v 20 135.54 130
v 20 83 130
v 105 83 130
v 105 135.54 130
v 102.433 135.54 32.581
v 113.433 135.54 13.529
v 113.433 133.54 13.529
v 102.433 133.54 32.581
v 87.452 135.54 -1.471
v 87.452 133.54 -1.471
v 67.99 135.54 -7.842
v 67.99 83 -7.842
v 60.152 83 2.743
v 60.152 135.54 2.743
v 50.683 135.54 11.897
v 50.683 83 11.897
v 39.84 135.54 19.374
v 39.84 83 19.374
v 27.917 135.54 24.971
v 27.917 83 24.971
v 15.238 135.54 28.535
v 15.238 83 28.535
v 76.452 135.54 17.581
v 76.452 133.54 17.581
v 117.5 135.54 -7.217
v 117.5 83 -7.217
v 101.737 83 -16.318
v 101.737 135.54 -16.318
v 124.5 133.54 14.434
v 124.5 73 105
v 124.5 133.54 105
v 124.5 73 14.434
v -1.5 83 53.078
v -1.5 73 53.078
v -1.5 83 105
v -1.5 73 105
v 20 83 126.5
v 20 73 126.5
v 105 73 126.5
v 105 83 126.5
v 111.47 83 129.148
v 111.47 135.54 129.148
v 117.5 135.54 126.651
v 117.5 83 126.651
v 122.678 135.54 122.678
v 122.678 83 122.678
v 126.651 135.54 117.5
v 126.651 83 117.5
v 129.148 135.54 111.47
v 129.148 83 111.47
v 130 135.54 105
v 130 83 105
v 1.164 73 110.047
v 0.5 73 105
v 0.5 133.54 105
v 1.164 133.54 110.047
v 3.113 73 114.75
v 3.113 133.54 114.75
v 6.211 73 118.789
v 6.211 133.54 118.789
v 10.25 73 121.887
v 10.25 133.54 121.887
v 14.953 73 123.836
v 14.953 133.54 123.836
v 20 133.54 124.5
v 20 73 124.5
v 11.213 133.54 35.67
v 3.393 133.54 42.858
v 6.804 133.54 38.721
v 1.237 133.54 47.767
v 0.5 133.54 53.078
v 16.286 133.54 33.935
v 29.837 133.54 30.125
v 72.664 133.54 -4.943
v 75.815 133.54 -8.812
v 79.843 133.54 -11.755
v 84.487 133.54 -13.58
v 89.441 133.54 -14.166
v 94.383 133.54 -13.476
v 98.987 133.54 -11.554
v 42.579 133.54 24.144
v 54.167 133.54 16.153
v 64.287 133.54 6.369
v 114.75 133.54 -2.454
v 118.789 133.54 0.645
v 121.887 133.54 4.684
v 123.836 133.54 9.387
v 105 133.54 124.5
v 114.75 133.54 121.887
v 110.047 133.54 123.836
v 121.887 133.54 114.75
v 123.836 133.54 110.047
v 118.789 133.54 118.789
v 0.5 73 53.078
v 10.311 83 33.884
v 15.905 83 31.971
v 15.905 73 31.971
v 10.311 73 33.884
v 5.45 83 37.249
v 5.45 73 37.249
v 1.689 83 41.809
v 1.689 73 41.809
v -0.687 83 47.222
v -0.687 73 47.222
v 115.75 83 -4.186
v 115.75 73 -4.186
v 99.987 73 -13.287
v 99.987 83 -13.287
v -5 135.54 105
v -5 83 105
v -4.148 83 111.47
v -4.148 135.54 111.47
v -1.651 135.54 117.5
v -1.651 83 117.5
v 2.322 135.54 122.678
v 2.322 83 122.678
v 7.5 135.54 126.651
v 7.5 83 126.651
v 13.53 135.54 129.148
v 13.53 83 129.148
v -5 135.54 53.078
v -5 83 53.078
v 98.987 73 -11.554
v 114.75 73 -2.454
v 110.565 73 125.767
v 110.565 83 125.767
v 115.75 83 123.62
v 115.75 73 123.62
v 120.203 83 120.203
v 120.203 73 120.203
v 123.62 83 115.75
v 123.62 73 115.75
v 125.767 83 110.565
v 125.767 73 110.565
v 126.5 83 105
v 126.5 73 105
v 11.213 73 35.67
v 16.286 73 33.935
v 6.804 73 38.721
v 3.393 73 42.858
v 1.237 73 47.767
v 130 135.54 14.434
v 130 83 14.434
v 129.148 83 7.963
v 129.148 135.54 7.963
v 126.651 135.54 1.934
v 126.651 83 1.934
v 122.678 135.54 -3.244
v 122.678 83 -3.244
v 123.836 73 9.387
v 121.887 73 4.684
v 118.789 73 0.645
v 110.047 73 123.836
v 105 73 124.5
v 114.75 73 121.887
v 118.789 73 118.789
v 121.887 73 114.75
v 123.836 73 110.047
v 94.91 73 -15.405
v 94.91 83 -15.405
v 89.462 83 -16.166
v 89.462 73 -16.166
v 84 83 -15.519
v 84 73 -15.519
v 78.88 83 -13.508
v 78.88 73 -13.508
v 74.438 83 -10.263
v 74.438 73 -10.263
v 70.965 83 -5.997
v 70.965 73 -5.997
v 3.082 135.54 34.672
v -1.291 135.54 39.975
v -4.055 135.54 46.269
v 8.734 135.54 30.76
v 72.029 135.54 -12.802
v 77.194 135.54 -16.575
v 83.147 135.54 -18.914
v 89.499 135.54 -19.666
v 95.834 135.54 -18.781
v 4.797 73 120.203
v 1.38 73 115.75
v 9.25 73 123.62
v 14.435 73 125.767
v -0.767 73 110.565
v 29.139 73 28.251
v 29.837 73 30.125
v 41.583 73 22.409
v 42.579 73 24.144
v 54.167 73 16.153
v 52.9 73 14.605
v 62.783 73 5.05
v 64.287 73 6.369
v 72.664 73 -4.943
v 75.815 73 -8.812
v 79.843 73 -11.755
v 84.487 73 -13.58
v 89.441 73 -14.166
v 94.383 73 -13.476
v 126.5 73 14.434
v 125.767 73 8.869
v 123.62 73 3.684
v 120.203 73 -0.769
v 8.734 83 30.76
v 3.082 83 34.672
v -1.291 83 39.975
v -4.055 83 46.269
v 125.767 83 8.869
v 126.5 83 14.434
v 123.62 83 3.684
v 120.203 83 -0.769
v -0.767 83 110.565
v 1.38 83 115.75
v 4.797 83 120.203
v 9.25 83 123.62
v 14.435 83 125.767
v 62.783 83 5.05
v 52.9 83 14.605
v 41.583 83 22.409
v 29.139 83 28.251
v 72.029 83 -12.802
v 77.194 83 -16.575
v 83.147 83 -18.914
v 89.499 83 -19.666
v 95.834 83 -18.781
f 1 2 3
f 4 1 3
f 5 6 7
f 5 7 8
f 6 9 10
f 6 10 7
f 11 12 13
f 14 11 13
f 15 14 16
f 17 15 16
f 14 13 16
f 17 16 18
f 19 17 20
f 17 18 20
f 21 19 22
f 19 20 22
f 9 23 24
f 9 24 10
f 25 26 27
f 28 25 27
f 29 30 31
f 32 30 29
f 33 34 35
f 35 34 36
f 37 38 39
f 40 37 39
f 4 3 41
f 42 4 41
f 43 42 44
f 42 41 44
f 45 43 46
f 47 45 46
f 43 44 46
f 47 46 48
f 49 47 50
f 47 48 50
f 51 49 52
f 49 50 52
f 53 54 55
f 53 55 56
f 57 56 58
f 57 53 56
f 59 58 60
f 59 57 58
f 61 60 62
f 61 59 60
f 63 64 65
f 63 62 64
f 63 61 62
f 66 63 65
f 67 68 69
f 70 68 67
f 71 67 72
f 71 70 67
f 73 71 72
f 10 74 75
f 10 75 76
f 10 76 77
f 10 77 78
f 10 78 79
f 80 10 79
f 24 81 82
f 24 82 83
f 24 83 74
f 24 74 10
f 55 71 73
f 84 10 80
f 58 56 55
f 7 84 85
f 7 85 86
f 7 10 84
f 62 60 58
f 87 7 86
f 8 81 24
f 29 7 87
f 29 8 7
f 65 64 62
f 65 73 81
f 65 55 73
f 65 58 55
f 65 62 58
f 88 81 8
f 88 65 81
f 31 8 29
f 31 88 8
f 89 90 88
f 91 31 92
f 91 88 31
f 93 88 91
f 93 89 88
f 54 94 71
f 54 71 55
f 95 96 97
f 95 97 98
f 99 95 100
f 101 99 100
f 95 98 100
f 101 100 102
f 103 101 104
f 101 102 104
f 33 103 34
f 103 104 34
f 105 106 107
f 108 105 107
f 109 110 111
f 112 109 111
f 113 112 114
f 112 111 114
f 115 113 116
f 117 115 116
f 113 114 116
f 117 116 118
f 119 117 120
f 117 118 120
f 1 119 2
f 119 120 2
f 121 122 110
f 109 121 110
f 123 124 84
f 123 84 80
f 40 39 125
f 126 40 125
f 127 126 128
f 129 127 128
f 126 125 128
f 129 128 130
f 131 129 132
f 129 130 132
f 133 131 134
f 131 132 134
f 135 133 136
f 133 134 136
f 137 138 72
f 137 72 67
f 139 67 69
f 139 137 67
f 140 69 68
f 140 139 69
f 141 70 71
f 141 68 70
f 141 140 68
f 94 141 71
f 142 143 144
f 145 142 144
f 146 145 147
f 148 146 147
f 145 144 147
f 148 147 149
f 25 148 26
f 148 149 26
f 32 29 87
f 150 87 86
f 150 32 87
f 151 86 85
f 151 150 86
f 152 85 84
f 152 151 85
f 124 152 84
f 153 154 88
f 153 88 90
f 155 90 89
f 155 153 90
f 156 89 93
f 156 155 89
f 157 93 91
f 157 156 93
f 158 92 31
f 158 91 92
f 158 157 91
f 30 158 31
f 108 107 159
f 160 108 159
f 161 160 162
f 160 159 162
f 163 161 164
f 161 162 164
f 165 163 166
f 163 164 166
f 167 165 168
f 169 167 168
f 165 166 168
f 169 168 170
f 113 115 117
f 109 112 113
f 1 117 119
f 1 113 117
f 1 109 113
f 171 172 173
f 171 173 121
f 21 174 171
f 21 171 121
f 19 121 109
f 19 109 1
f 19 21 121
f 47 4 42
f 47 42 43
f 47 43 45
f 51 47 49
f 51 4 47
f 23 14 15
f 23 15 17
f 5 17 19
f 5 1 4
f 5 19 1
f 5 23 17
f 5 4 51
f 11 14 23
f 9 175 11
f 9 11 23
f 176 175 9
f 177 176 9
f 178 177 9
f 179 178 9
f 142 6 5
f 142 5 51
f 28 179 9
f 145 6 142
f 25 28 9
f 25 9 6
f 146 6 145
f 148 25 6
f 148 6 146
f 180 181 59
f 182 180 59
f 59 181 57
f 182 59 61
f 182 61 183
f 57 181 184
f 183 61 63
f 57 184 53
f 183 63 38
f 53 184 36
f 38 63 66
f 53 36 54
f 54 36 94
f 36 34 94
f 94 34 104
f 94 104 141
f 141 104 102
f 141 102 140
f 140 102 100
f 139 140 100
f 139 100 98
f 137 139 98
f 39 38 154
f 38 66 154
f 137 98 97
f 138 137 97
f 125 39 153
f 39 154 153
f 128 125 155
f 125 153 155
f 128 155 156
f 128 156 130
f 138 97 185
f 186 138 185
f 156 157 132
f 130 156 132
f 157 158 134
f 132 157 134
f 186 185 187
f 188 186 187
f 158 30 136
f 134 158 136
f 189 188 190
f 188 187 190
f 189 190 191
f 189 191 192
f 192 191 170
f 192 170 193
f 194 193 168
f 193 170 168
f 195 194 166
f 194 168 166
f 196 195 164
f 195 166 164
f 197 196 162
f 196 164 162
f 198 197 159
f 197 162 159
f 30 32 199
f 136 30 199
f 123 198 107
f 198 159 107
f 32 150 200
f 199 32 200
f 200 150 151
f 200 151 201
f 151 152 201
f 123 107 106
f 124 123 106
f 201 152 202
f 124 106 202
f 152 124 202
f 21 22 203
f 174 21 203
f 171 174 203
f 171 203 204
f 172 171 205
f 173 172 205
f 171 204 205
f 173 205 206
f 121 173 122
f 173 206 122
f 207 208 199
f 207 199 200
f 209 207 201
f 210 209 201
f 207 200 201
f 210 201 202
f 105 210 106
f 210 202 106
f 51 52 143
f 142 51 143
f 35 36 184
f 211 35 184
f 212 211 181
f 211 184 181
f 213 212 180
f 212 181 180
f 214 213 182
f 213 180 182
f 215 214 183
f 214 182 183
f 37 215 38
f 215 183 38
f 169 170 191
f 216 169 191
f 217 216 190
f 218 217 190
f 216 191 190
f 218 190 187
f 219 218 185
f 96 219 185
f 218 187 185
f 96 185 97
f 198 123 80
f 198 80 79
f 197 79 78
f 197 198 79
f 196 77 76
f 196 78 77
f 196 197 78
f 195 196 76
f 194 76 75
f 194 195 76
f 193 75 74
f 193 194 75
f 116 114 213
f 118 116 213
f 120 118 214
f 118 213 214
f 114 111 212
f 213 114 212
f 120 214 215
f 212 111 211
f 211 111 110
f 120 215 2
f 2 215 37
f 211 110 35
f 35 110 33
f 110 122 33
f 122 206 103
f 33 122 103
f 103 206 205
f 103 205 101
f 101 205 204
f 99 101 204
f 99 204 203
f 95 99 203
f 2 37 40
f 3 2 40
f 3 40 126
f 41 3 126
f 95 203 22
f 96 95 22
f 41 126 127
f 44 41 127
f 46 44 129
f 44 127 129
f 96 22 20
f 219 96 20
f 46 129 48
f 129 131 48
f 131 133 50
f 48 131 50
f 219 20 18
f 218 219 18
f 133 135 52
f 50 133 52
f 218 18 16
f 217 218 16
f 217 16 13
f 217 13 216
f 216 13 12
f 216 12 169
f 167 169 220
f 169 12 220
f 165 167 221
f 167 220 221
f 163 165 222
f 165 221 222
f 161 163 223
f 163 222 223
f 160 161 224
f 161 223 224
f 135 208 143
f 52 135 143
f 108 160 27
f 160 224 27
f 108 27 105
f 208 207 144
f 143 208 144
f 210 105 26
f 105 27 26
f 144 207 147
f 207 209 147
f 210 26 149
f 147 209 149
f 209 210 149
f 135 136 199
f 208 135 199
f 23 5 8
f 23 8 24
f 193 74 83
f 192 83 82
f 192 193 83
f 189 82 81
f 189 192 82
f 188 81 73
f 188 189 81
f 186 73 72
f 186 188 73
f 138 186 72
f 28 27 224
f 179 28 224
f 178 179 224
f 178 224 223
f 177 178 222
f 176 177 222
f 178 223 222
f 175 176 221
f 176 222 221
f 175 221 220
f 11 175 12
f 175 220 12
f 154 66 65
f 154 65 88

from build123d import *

# Parameters (mm, degrees)
SKETCH1_W               = 260
SKETCH1_H               = 100
BOSS_EXTRUDE1_DEPTH     = 3
CUT_EXTRUDE1_DEPTH      = 5
SKETCH5_W               = 260
SKETCH5_H               = 80
BOSS_EXTRUDE4_DEPTH     = 3
BOSS_EXTRUDE5_START     = 70
BOSS_EXTRUDE5_DEPTH     = 70
BOSS_EXTRUDE6_DEPTH     = 70
CUT_EXTRUDE3_DEPTH      = 198.810515393
SKETCH10_R              = 5
SKETCH10_R_2            = 1.75
BOSS_EXTRUDE7_DEPTH     = 50
CHAMFER1_SIZE           = 5
CHAMFER1_SIZE2          = 8.660254038
FILLET1_R               = 22
FILLET2_R               = 25
CUT_EXTRUDE4_START      = 20
CUT_EXTRUDE4_DEPTH      = 20
SKETCH12_R              = 1.75
CUT_EXTRUDE5_DEPTH      = 20
CUT_EXTRUDE6_DEPTH      = 40
FILLET3_R               = 5
BOSS_EXTRUDE8_DEPTH     = 10
CUT_EXTRUDE7_DEPTH      = 202.715145688
CUT_EXTRUDE7_DEPTH_BACK = 202.715145688
SKETCH16_W              = 135
SKETCH16_H              = 73
BOSS_EXTRUDE9_DEPTH     = 52.54
CUT_EXTRUDE8_DEPTH      = 5
CUT_EXTRUDE10_DEPTH     = 50.54


with BuildPart() as part:
    # Sketch1 → Boss-Extrude1 (new body)
    with BuildSketch(Plane(origin=(0, 0, 0), x_dir=(1, 0, 0), z_dir=(0, 1, 0))):
        Rectangle(SKETCH1_W, SKETCH1_H)
    extrude(amount=BOSS_EXTRUDE1_DEPTH)

    # Sketch4 → Cut-Extrude1 (cut)
    with BuildSketch(Plane(origin=(0, 3, 0), x_dir=(1, 0, 0), z_dir=(0, 1, 0))):
        with BuildLine():
            Line((-77.534249575, 30.291115131), (-130, 0))
            Line((-130, 0), (-130, 50))
            Line((-130, 50), (130, 50))
            Line((130, 50), (130, 0))
            Line((130, 0), (77.534249575, 30.291115131))
            ThreePointArc((77.534249575, 30.291115131), (0, -30), (-77.534249575, 30.291115131))
        make_face()
    extrude(amount=-CUT_EXTRUDE1_DEPTH, mode=Mode.SUBTRACT)

    # Sketch5 → Boss-Extrude4 (add)
    with BuildSketch(Plane(origin=(0, 3, 0), x_dir=(1, 0, 0), z_dir=(0, 1, 0))):
        with Locations((0, -90)):
            Rectangle(SKETCH5_W, SKETCH5_H)
    extrude(amount=-BOSS_EXTRUDE4_DEPTH)

    # Sketch6 → Boss-Extrude5 (add)
    with BuildSketch(Plane(origin=(0, 3, 0), x_dir=(1, 0, 0), z_dir=(0, 1, 0)).offset(BOSS_EXTRUDE5_START)):
        with BuildLine():
            Line((-77.534249575, 30.291115131), (-130, 0))
            Line((-130, 0), (-130, -130))
            Line((-130, -130), (130, -130))
            Line((130, -130), (130, 0))
            Line((130, 0), (77.534249575, 30.291115131))
            ThreePointArc((77.534249575, 30.291115131), (0, -30), (-77.534249575, 30.291115131))
        make_face()
        with BuildLine():
            Line((-79.381629809, 25.76042804), (-127, -1.732050808))
            Line((-127, -1.732050808), (-127, -127))
            Line((-127, -127), (127, -127))
            Line((127, -127), (127, -1.732050808))
            Line((127, -1.732050808), (79.381629809, 25.76042804))
            ThreePointArc((79.381629809, 25.76042804), (0, -33), (-79.381629809, 25.76042804))
        make_face(mode=Mode.SUBTRACT)
    extrude(amount=-BOSS_EXTRUDE5_DEPTH)

    # Sketch7 → Boss-Extrude6 (add)
    with BuildSketch(Plane(origin=(0, 73, 0), x_dir=(1, 0, 0), z_dir=(0, 1, 0))):
        with BuildLine():
            Line((-5, -32.849260709), (-5, -130))
            Line((-5, -130), (-2, -130))
            Line((-2, -130), (-2, -32.975900116))
            ThreePointArc((-2, -32.975900116), (-3.500572722, -32.92614781), (-5, -32.849260709))
        make_face()
    extrude(amount=-BOSS_EXTRUDE6_DEPTH)

    # Sketch9 → Cut-Extrude3 (cut, through all)
    with BuildSketch(Plane(origin=(0, 73, 0), x_dir=(1, 0, 0), z_dir=(0, 1, 0))):
        Polygon((-5, -32.849260709), (-5, -144.876678539), (-379.728059333, -144.876678539), (-379.728059333, 52.069032857), (-5, 52.069032857), align=None)
    extrude(amount=-CUT_EXTRUDE3_DEPTH, mode=Mode.SUBTRACT)

    # Sketch10 → Boss-Extrude7 (add)
    # profile 1 of 4: a face of its own
    with BuildSketch(Plane(origin=(0, 3, 0), x_dir=(1, 0, 0), z_dir=(0, 1, 0))):
        with Locations(Location((14, -46.75, 0), (0, 0, 90))):
            Circle(SKETCH10_R)
        with Locations(Location((14, -46.75, 0), (0, 0, 270))):
            Circle(SKETCH10_R_2, mode=Mode.SUBTRACT)
    # profile 2 of 4: a face of its own
    with BuildSketch(Plane(origin=(0, 3, 0), x_dir=(1, 0, 0), z_dir=(0, 1, 0))):
        with Locations(Location((86, -46.75, 0), (0, 0, 90))):
            Circle(SKETCH10_R)
        with Locations(Location((86, -46.75, 0), (0, 0, 270))):
            Circle(SKETCH10_R_2, mode=Mode.SUBTRACT)
    # profile 3 of 4: a face of its own
    with BuildSketch(Plane(origin=(0, 3, 0), x_dir=(1, 0, 0), z_dir=(0, 1, 0))):
        with Locations(Location((86, -113.25, 0), (0, 0, 90))):
            Circle(SKETCH10_R)
        with Locations(Location((86, -113.25, 0), (0, 0, 270))):
            Circle(SKETCH10_R_2, mode=Mode.SUBTRACT)
    # profile 4 of 4: a face of its own
    with BuildSketch(Plane(origin=(0, 3, 0), x_dir=(1, 0, 0), z_dir=(0, 1, 0))):
        with Locations(Location((14, -113.25, 0), (0, 0, 90))):
            Circle(SKETCH10_R)
        with Locations(Location((14, -113.25, 0), (0, 0, 270))):
            Circle(SKETCH10_R_2, mode=Mode.SUBTRACT)
    extrude(amount=BOSS_EXTRUDE7_DEPTH)

    # Chamfer1
    chamfer1_edges = [part.edges().sort_by_distance(p)[0] for p in [
        (86, 3, 51.75),
        (14, 3, 51.75),
        (86, 3, 118.25),
        (14, 3, 118.25),
    ]]
    chamfer1_side = [part.faces().sort_by_distance(p)[0] for p in [
        (68.049806081, 3, 64.998636776),
    ]]
    chamfer(chamfer1_edges, length=CHAMFER1_SIZE, length2=CHAMFER1_SIZE2, reference=chamfer1_side[0])

    # Fillet1
    fillet1_edges = [part.edges().sort_by_distance(p)[0] for p in [
        (-2, 38, 127),
        (-2, 38, 32.975900116),
        (127, 38, 127),
        (127, 38, 1.732050808),
        (79.381629809, 38, -25.76042804),
    ]]
    fillet(fillet1_edges, radius=FILLET1_R)

    # Fillet2
    fillet2_edges = [part.edges().sort_by_distance(p)[0] for p in [
        (-5, 36.5, 29.843597113),
        (-5, 36.5, 130),
        (77.534249575, 36.5, -30.291115131),
        (130, 36.5, 0),
        (130, 36.5, 130),
    ]]
    fillet(fillet2_edges, radius=FILLET2_R)

    # Sketch11 → Cut-Extrude4 (cut)
    with BuildSketch(Plane(origin=(0, 3, 0), x_dir=(1, 0, 0), z_dir=(0, 1, 0)).offset(CUT_EXTRUDE4_START)):
        with BuildLine():
            Line((52.464250206, -10.394556462), (54.431659589, -12.65935233))
            ThreePointArc((54.431659589, -12.65935233), (36.359512028, -24.612236832), (15.80952381, -31.480420697))
            Line((15.80952381, -31.480420697), (15.238095238, -28.53534525))
            ThreePointArc((15.238095238, -28.53534525), (35.045312798, -21.915408995), (52.464250206, -10.394556462))
        make_face()
        Polygon((101.737077009, 16.317606197), (100.237077009, 13.719529986), (116, 4.618802154), (117.5, 7.216878365), align=None)
    extrude(amount=-CUT_EXTRUDE4_DEPTH, mode=Mode.SUBTRACT)

    # Sketch12 → Cut-Extrude5 (cut)
    with BuildSketch(Plane(origin=(0, 3, 0), x_dir=(1, 0, 0), z_dir=(0, 1, 0))):
        with Locations(Location((89.237077009, -5.333028897, 0), (0, 0, 270))):
            Circle(SKETCH12_R)
        with Locations(Location((105, -105, 0), (0, 0, 270))):
            Circle(SKETCH12_R)
        with Locations(Location((15, -105, 0), (0, 0, 66.494954424))):
            Circle(SKETCH12_R)
        with Locations(Location((15, -55, 0), (0, 0, 260.317408662))):
            Circle(SKETCH12_R)
    extrude(amount=-CUT_EXTRUDE5_DEPTH, mode=Mode.SUBTRACT)

    # Sketch14 → Cut-Extrude6 (cut)
    with BuildSketch(Plane.XZ.offset(-23)):
        Polygon((101.737077009, -16.317606197), (117.5, -7.216878365), (116, -4.618802154), (100.237077009, -13.719529986), align=None)
    extrude(amount=-CUT_EXTRUDE6_DEPTH, mode=Mode.SUBTRACT)

    # Fillet3
    # the kernel refuses this fillet: 5 mm, written as the material it adds along each edge
    with BuildSketch(Plane(origin=(101.737077009, 3, -16.317606197), x_dir=(0.8660254037844373, 0, 0.5000000000000024), z_dir=(-0.5000000000000026, 0, 0.8660254037844373))) as fillet3_piece_1_section:
        with BuildLine():
            CenterArc((FILLET3_R, FILLET3_R), FILLET3_R, 180, 90)
            Line((0, FILLET3_R), (0, 0))
            Line((0, 0), (FILLET3_R, 0))
        make_face()
    fillet3_piece_1 = extrude(amount=15.5, mode=Mode.PRIVATE)
    fillet3_piece_1 = fillet3_piece_1 - Plane(origin=(89.237077009, 3.433810283, 5.333028897), x_dir=(-0.8498769238912803, 0, -0.5269812275945843), z_dir=(0, -1, 0)) * Cylinder(22, 52, mode=Mode.PRIVATE)
    add(fillet3_piece_1)
    with BuildSketch(Plane(origin=(109.75, 3, 6.206515394), x_dir=(-0.8660254037844346, 0, -0.500000000000007), z_dir=(0.500000000000007, 0, -0.8660254037844346))) as fillet3_piece_2_section:
        with BuildLine():
            CenterArc((FILLET3_R, FILLET3_R), FILLET3_R, 180, 90)
            Line((0, FILLET3_R), (0, 0))
            Line((0, 0), (FILLET3_R, 0))
        make_face()
    fillet3_piece_2 = extrude(amount=15.5, mode=Mode.PRIVATE)
    fillet3_piece_2 = fillet3_piece_2 - Plane(origin=(105, 4.115508028, 14.43375673), x_dir=(0.5000000000000037, 0, -0.8660254037844366), z_dir=(0, -1, 0)) * Cylinder(22, 51, mode=Mode.PRIVATE)
    add(fillet3_piece_2)
    with BuildSketch(Plane(origin=(44.266711112, 3, 0.957907015), x_dir=(-0.754931955778907, 0, 0.6558031275800951), z_dir=(0.6558031275800951, 0, 0.754931955778907))) as fillet3_piece_3_section:
        with BuildLine():
            CenterArc((FILLET3_R, -FILLET3_R), FILLET3_R, 90, 90)
            Line((0, -FILLET3_R), (0, 0))
            Line((0, 0), (FILLET3_R, 0))
        make_face()
    fillet3_piece_3 = extrude(amount=28, mode=Mode.PRIVATE)
    fillet3_piece_3 = fillet3_piece_3 & Plane(origin=(0, 4.116736713, -50), x_dir=(0.9564051784275456, 0, 0.2920430356590872), z_dir=(0, 1, 0)) * Cylinder(83, 77, mode=Mode.PRIVATE)
    fillet3_piece_3 = fillet3_piece_3 - Plane(origin=(0, 4.116736713, -50), x_dir=(0.9691781196921706, 0, 0.2463610608638238), z_dir=(0, 1, 0)) * Cylinder(80, 77, mode=Mode.PRIVATE)
    add(fillet3_piece_3)
    with BuildSketch(Plane(origin=(18.19047619, 3, 43.751568392), x_dir=(0.9816918156232519, 0, -0.19047619047619338), z_dir=(-0.19047619047619338, 0, -0.981691815623252))) as fillet3_piece_4_section:
        with BuildLine():
            CenterArc((FILLET3_R, -FILLET3_R), FILLET3_R, 90, 90)
            Line((0, -FILLET3_R), (0, 0))
            Line((0, 0), (FILLET3_R, 0))
        make_face()
    fillet3_piece_4 = extrude(amount=28, mode=Mode.PRIVATE)
    fillet3_piece_4 = fillet3_piece_4 - Plane(origin=(20, 4.115502573, 53.07764064), x_dir=(-0.19047619047619013, 0, -0.9816918156232526), z_dir=(0, -1, 0)) * Cylinder(22, 77, mode=Mode.PRIVATE)
    fillet3_piece_4 = fillet3_piece_4 - Plane(origin=(0, 4.115502573, -50), x_dir=(0.9691781196921706, 0, 0.2463610608638238), z_dir=(0, 1, 0)) * Cylinder(80, 77, mode=Mode.PRIVATE)
    add(fillet3_piece_4)
    with BuildSketch(Plane(origin=(44.266711112, 23, 0.957907015), x_dir=(-0.754931955778907, 0, 0.6558031275800951), z_dir=(0.6558031275800951, 0, 0.754931955778907))) as fillet3_piece_5_section:
        with BuildLine():
            CenterArc((FILLET3_R, FILLET3_R), FILLET3_R, 180, 90)
            Line((0, FILLET3_R), (0, 0))
            Line((0, 0), (FILLET3_R, 0))
        make_face()
    fillet3_piece_5 = extrude(amount=28, mode=Mode.PRIVATE)
    fillet3_piece_5 = fillet3_piece_5 & Plane(origin=(0, 21.883263287, -50), x_dir=(0.9564051784275456, 0, 0.2920430356590872), z_dir=(0, 1, 0)) * Cylinder(83, 77, mode=Mode.PRIVATE)
    fillet3_piece_5 = fillet3_piece_5 - Plane(origin=(0, 21.883263287, -50), x_dir=(0.9691781196921706, 0, 0.2463610608638238), z_dir=(0, 1, 0)) * Cylinder(80, 77, mode=Mode.PRIVATE)
    add(fillet3_piece_5)
    with BuildSketch(Plane(origin=(18.19047619, 23, 43.751568392), x_dir=(0, -1, 0), z_dir=(-0.19047619047619338, 0, -0.981691815623252))) as fillet3_piece_6_section:
        with BuildLine():
            CenterArc((FILLET3_R, -FILLET3_R), FILLET3_R, 90, 90)
            Line((0, -FILLET3_R), (0, 0))
            Line((0, 0), (FILLET3_R, 0))
        make_face()
    fillet3_piece_6 = extrude(amount=28, mode=Mode.PRIVATE)
    fillet3_piece_6 = fillet3_piece_6 & Plane(origin=(0, 21.870297326, -50), x_dir=(0.9564051784275456, 0, 0.2920430356590872), z_dir=(0, 1, 0)) * Cylinder(83, 77, mode=Mode.PRIVATE)
    fillet3_piece_6 = fillet3_piece_6 - Plane(origin=(0, 21.870297326, -50), x_dir=(0.9691781196921706, 0, 0.2463610608638238), z_dir=(0, 1, 0)) * Cylinder(80, 77, mode=Mode.PRIVATE)
    add(fillet3_piece_6)
    with BuildSketch(Plane(origin=(100.237077009, 63, -13.719529986), x_dir=(0.866025403784437, 0, 0.5000000000000028), z_dir=(0.5000000000000028, 0, -0.866025403784437))) as fillet3_piece_7:
        with BuildLine():
            CenterArc((FILLET3_R, FILLET3_R), FILLET3_R, 180, 90)
            Line((0, FILLET3_R), (0, 0))
            Line((0, 0), (FILLET3_R, 0))
        make_face()
    extrude(amount=3)
    with BuildSketch(Plane(origin=(117.5, 63, -7.216878365), x_dir=(0, -1, 0), z_dir=(-0.500000000000007, 0, 0.8660254037844346))) as fillet3_piece_8:
        with BuildLine():
            CenterArc((FILLET3_R, -FILLET3_R), FILLET3_R, 90, 90)
            Line((0, -FILLET3_R), (0, 0))
            Line((0, 0), (FILLET3_R, 0))
        make_face()
    extrude(amount=3)

    # Sketch16 → Cut-Extrude7 (cut, two sides: drawn at the far end of the back side and taken through both)
    with BuildSketch(Plane.XY.offset(-CUT_EXTRUDE7_DEPTH_BACK)):
        with Locations((62.5, 36.5)):
            Rectangle(SKETCH16_W, SKETCH16_H)
    extrude(amount=CUT_EXTRUDE7_DEPTH + CUT_EXTRUDE7_DEPTH_BACK, mode=Mode.SUBTRACT)


with BuildPart() as body_2:
    # Sketch15 → Boss-Extrude8 (new body)
    with BuildSketch(Plane(origin=(0, 73, 0), x_dir=(1, 0, 0), z_dir=(0, 1, 0))):
        with BuildLine():
            Line((126.5, -105), (126.5, -14.43375673))
            ThreePointArc((126.5, -14.43375673), (123.619546181, -3.68375673), (115.75, 4.185789452))
            Line((115.75, 4.185789452), (99.987077009, 13.286517284))
            ThreePointArc((99.987077009, 13.286517284), (83.999666249, 15.519297796), (70.964723145, 5.997067496))
            ThreePointArc((70.964723145, 5.997067496), (47.402272696, -18.740632403), (15.904761905, -31.971266605))
            ThreePointArc((15.904761905, -31.971266605), (3.412389879, -39.399146919), (-1.5, -53.07764064))
            Line((-1.5, -53.07764064), (-1.5, -105))
            ThreePointArc((-1.5, -105), (4.797204204, -120.202795796), (20, -126.5))
            Line((20, -126.5), (105, -126.5))
            ThreePointArc((105, -126.5), (120.202795796, -120.202795796), (126.5, -105))
        make_face()
        with BuildLine():
            Line((124.5, -105), (124.5, -14.43375673))
            ThreePointArc((124.5, -14.43375673), (121.887495374, -4.68375673), (114.75, 2.453738644))
            Line((114.75, 2.453738644), (98.987077009, 11.554466476))
            ThreePointArc((98.987077009, 11.554466476), (84.48686725, 13.579546476), (72.664476993, 4.943105041))
            ThreePointArc((72.664476993, 4.943105041), (48.537656474, -20.387114617), (16.285714286, -33.934650236))
            ThreePointArc((16.285714286, -33.934650236), (4.955423379, -40.67156494), (0.5, -53.07764064))
            Line((0.5, -53.07764064), (0.5, -105))
            ThreePointArc((0.5, -105), (6.211417767, -118.788582233), (20, -124.5))
            Line((20, -124.5), (105, -124.5))
            ThreePointArc((105, -124.5), (118.788582233, -118.788582233), (124.5, -105))
        make_face(mode=Mode.SUBTRACT)
    extrude(amount=BOSS_EXTRUDE8_DEPTH)

    # Sketch17 → Boss-Extrude9 (add)
    with BuildSketch(Plane(origin=(0, 83, 0), x_dir=(1, 0, 0), z_dir=(0, 1, 0))):
        with BuildLine():
            Line((130, -105), (130, -14.43375673))
            ThreePointArc((130, -14.43375673), (126.650635095, -1.93375673), (117.5, 7.216878365))
            Line((117.5, 7.216878365), (101.737077009, 16.317606197))
            ThreePointArc((101.737077009, 16.317606197), (83.147064497, 18.913862607), (67.990153911, 7.841501792))
            ThreePointArc((67.990153911, 7.841501792), (45.415351086, -15.85928853), (15.238095238, -28.53534525))
            ThreePointArc((15.238095238, -28.53534525), (0.712081255, -37.172415383), (-5, -53.07764064))
            Line((-5, -53.07764064), (-5, -105))
            ThreePointArc((-5, -105), (2.32233047, -122.67766953), (20, -130))
            Line((20, -130), (105, -130))
            ThreePointArc((105, -130), (122.67766953, -122.67766953), (130, -105))
        make_face()
    extrude(amount=BOSS_EXTRUDE9_DEPTH)

    # Sketch18 → Cut-Extrude8 (cut)
    with BuildSketch(Plane(origin=(0, 135.54, 0), x_dir=(1, 0, 0), z_dir=(0, 1, 0))):
        Polygon((87.451905284, 1.47114317), (113.432667397, -13.52885683), (102.432667397, -32.581415713), (76.451905284, -17.581415713), align=None)
    extrude(amount=-CUT_EXTRUDE8_DEPTH, mode=Mode.SUBTRACT)

    # Sketch20 → Cut-Extrude10 (cut)
    with BuildSketch(Plane.XZ.offset(-83)):
        with BuildLine():
            Line((124.5, 14.43375673), (124.5, 105))
            ThreePointArc((124.5, 105), (118.788582233, 118.788582233), (105, 124.5))
            Line((105, 124.5), (20, 124.5))
            ThreePointArc((20, 124.5), (6.211417767, 118.788582233), (0.5, 105))
            Line((0.5, 105), (0.5, 53.07764064))
            ThreePointArc((0.5, 53.07764064), (4.955423379, 40.67156494), (16.285714286, 33.934650236))
            ThreePointArc((16.285714286, 33.934650236), (48.537656474, 20.387114617), (72.664476993, -4.943105041))
            ThreePointArc((72.664476993, -4.943105041), (84.48686725, -13.579546476), (98.987077009, -11.554466476))
            Line((98.987077009, -11.554466476), (114.75, -2.453738644))
            ThreePointArc((114.75, -2.453738644), (121.887495374, 4.68375673), (124.5, 14.43375673))
        make_face()
    extrude(amount=-CUT_EXTRUDE10_DEPTH, mode=Mode.SUBTRACT)


solid = body_2.part
